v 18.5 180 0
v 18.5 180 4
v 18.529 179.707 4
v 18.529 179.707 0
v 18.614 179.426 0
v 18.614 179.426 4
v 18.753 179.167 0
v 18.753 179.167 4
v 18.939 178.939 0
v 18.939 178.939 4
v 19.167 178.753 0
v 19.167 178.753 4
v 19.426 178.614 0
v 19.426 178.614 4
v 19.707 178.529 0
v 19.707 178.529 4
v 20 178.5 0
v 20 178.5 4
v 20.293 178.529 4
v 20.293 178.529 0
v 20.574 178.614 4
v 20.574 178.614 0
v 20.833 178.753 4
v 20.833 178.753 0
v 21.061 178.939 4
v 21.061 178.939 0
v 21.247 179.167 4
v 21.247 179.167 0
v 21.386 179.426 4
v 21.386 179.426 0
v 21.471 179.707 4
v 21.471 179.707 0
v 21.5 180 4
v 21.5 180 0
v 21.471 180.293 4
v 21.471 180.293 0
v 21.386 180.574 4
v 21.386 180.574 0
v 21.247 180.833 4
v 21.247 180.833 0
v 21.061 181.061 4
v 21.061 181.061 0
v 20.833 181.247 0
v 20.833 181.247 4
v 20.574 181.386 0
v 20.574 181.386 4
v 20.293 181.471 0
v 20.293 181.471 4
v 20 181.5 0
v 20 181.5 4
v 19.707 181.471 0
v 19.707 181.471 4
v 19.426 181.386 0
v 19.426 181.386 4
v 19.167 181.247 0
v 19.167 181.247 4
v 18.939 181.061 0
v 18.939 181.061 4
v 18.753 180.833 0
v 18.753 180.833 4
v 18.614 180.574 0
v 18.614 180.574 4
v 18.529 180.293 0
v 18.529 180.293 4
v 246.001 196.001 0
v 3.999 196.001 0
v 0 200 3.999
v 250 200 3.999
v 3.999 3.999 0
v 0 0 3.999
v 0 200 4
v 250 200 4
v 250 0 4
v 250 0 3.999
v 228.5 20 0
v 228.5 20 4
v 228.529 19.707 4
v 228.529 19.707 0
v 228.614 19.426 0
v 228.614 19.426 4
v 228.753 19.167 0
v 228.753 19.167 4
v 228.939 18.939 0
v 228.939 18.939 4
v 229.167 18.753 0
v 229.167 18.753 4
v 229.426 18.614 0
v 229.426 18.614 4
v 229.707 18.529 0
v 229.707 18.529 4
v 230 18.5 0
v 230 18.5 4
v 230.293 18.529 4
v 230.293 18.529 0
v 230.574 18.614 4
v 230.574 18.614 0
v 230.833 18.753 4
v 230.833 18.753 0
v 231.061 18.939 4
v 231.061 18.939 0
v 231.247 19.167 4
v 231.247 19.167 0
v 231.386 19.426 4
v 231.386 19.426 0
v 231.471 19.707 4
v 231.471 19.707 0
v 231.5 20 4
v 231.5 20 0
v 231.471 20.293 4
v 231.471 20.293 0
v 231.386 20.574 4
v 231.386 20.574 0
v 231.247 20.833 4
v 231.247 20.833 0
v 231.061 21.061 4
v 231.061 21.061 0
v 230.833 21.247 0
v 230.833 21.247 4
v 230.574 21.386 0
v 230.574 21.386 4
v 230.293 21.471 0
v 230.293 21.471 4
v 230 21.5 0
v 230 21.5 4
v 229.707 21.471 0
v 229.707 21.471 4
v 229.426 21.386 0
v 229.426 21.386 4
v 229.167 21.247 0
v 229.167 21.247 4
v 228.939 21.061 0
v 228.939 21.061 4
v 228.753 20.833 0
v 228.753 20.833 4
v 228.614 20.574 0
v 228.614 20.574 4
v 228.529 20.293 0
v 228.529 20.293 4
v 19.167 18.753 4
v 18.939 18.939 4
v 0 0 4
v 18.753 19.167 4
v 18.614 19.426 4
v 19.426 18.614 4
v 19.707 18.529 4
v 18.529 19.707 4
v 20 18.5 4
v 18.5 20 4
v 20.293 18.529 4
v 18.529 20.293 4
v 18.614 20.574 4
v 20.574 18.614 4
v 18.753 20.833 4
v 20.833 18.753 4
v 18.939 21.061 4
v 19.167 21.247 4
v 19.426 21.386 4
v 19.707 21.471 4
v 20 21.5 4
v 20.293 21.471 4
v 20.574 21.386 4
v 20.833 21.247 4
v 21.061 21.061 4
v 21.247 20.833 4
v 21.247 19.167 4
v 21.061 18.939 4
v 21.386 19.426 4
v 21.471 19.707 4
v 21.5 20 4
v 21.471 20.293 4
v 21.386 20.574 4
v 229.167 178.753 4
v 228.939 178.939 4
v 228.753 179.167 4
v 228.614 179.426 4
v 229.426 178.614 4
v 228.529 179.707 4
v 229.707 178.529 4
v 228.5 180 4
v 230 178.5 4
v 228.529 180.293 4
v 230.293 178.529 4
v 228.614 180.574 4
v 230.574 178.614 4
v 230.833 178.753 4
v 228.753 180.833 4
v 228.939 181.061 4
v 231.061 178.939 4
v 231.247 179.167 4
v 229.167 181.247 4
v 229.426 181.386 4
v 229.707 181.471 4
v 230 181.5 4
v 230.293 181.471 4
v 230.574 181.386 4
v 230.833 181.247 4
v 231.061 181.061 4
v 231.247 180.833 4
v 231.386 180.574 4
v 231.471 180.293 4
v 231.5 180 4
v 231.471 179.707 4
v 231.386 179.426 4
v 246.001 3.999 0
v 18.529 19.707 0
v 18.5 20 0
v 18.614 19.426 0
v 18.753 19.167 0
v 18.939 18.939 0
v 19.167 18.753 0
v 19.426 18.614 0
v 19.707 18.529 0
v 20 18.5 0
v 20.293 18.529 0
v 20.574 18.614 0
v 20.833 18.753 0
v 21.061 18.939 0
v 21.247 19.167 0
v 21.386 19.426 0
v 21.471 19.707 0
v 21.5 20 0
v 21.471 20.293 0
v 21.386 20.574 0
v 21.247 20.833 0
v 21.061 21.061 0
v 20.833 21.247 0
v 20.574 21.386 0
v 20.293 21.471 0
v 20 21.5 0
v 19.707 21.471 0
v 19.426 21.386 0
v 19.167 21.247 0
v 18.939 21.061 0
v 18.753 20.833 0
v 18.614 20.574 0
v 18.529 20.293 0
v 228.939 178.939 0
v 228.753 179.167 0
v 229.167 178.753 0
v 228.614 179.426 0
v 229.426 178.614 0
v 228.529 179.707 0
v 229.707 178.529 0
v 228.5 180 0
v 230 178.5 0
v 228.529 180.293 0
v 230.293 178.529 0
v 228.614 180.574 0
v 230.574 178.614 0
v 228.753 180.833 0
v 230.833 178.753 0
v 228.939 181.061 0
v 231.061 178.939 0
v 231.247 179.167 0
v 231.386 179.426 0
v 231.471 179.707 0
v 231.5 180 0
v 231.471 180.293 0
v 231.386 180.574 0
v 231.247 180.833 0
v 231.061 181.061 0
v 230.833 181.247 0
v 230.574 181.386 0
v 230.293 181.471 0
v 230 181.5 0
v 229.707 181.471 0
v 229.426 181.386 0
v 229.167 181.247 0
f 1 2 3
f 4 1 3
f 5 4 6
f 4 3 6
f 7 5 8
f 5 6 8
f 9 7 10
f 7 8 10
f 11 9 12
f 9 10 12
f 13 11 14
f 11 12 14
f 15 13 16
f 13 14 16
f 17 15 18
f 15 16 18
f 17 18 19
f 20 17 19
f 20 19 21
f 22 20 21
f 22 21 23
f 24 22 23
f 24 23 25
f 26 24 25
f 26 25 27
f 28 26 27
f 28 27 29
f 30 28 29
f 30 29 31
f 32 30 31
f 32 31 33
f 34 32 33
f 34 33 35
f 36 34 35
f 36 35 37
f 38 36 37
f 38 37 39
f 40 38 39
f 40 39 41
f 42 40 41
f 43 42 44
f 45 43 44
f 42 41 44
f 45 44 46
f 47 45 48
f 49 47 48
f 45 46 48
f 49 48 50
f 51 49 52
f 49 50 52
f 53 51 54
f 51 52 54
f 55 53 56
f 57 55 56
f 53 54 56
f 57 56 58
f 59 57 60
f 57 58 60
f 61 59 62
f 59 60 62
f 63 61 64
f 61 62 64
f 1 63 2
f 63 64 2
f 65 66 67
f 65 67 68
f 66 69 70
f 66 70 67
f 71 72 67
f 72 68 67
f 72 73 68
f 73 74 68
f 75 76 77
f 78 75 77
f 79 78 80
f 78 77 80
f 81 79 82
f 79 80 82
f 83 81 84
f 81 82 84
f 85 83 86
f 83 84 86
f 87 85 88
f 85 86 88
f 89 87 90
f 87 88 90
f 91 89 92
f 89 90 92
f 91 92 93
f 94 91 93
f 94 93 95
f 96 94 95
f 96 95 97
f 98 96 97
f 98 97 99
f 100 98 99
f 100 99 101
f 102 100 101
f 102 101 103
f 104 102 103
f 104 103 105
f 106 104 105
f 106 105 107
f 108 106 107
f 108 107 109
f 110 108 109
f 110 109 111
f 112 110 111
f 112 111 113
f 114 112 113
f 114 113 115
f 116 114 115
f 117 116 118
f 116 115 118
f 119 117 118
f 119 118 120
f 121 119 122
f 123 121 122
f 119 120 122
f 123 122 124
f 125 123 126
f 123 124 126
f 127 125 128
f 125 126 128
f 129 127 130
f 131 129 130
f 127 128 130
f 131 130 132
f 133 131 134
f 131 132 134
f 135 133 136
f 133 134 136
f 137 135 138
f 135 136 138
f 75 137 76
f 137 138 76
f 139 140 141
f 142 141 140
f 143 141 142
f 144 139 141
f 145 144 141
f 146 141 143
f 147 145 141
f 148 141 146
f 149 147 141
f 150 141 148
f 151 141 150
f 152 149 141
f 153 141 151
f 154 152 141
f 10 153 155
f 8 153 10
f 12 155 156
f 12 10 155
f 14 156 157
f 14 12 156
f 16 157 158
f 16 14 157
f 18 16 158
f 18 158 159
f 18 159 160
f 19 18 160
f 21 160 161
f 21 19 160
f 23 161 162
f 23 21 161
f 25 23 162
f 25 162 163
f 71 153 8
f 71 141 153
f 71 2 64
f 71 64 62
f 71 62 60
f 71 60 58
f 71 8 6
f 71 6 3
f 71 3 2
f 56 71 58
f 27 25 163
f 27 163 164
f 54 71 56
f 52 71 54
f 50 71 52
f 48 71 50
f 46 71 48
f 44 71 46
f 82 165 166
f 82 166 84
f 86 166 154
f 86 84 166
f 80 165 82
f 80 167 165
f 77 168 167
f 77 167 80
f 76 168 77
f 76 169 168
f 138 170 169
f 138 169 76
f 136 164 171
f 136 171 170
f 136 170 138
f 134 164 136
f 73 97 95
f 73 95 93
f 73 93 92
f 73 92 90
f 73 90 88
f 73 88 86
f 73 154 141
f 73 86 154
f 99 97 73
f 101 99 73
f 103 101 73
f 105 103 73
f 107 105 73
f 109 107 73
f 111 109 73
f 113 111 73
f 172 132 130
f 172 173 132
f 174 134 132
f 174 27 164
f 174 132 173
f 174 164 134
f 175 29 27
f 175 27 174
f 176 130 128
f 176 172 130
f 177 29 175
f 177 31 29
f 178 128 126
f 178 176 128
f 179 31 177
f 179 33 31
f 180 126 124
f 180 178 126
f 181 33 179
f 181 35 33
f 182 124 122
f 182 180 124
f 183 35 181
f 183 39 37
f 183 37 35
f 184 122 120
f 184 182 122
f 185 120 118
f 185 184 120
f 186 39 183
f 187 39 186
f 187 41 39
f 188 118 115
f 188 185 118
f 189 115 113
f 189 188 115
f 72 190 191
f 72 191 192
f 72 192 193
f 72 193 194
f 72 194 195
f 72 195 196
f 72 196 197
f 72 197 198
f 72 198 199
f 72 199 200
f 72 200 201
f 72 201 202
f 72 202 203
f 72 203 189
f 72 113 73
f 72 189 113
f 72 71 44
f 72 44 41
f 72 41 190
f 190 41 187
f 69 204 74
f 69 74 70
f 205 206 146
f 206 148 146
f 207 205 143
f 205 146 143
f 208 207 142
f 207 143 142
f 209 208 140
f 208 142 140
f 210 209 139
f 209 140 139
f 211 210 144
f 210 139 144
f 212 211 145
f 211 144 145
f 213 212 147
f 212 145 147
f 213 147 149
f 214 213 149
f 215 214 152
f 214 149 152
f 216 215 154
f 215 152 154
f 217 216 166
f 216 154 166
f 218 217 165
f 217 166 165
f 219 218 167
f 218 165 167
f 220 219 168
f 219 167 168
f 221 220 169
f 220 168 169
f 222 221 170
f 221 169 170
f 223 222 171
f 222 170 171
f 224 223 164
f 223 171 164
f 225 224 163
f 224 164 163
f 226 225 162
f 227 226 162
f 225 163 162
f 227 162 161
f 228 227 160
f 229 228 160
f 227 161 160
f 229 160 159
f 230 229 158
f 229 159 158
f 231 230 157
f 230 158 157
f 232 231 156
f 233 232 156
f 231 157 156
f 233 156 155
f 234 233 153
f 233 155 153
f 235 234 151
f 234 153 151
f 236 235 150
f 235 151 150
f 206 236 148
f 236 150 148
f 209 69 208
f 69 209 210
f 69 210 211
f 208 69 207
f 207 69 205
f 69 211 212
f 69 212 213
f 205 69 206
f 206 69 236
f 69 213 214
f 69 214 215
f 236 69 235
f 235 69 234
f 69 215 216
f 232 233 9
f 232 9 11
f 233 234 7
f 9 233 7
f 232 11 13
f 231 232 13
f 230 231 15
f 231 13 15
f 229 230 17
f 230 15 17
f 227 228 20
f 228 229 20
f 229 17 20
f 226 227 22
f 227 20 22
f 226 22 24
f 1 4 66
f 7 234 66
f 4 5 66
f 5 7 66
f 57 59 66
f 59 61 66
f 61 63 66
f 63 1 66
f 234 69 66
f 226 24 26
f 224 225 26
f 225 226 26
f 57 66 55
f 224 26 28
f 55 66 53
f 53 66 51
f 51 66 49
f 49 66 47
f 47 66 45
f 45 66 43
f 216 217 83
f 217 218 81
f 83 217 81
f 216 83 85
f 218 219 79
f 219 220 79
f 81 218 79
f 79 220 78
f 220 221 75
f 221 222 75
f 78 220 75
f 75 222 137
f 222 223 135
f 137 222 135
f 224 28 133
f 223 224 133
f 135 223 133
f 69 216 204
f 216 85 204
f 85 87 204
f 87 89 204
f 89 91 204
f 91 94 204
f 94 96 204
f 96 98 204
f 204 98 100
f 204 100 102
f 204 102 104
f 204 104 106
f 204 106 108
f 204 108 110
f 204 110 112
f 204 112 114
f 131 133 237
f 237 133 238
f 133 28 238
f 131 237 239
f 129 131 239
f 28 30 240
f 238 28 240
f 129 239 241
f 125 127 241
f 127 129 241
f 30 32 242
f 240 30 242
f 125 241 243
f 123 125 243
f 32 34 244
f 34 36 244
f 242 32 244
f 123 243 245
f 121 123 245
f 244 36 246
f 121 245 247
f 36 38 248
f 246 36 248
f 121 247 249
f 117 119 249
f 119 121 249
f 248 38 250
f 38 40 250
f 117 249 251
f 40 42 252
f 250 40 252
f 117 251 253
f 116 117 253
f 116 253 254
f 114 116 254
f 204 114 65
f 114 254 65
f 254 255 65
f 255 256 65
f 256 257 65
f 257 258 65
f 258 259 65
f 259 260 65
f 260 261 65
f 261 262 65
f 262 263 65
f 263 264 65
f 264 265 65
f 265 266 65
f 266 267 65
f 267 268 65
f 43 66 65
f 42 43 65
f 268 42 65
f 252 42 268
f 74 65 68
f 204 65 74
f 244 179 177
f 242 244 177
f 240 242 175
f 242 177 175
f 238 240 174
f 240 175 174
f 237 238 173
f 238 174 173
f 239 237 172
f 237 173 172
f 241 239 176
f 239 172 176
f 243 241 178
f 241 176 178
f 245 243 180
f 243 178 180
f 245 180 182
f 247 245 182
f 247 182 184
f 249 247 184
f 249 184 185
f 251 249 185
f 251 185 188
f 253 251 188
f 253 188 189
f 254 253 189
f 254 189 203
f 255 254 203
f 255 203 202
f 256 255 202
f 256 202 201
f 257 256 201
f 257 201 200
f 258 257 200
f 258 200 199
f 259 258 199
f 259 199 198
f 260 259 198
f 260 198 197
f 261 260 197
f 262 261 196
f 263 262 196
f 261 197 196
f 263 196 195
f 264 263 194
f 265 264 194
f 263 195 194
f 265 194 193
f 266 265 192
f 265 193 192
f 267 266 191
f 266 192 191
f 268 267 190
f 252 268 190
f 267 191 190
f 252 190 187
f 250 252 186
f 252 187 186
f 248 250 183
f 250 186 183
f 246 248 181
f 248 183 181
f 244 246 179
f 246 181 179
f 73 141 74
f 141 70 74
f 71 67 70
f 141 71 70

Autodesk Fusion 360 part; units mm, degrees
sketch "Esquisse1" plane through (0, 0, 0) normal (0, 0, 1) x (1, 0, 0)
  line L0 (0, 0) -> (250, 0)
  line L1 (250, 0) -> (250, 200)
  line L2 (250, 200) -> (0, 200)
  line L3 (0, 200) -> (0, 0)
  dimension "d18" = 200
  dimension "d19" = 250
extrude "Extrusion1" add sketch "Esquisse1" along normal blind 4
chamfer "Chanfrein1" distance 4 angle 45 1 faces at (83.3333, 133.3333, 0)
sketch "Esquisse2" plane through (0, 0, 4) normal (0, 0, 1) x (-1, 0, 0)
  circle A0 centre (-20, -180) radius 1.5
  circle A1 centre (-230, -180) radius 1.5
  circle A2 centre (-230, -20) radius 1.5
  circle A3 centre (-20, -20) radius 1.5
  line L0 (0, 0) -> (-20, -20)
  line L1 (-250, 0) -> (-230, -20)
  line L2 (-250, 0) -> (-297.1716, 0) construction
  line L3 (0, -200) -> (-20, -180)
  line L4 (-250, -200) -> (-230, -180)
  line L5 (-250, -200) -> (-297.1716, -200) construction
  line L6 (0, -200) -> (0, 0)
  line L7 (0, 0) -> (-250, 0)
  line L8 (-250, 0) -> (-250, -200)
  line L9 (-250, -200) -> (0, -200)
  dimension "d10" = 3
  dimension "d11" = 3
  dimension "d12" = 3
  dimension "d13" = 3
  dimension "d20" = 28.2843
  dimension "d22" = 45
  dimension "d23" = 28.2843
  dimension "d24" = 28.2843
  dimension "d25" = 28.2843
  dimension "d26" = 45
extrude "Extrusion2" cut sketch "Esquisse2" against normal blind 14 contours A0 | A1 | A2 | A3
thread "Filetage1" "ISO Metric profile 4.0 M4x0.7 M4x0.7 6H" major diameter 4.1095 minor diameter 3.332 pitch 0.7 angle 60 resizes the face on face at (21.4536, 179.6299, 2.6667)
thread "Filetage2" "ISO Metric profile 4.0 M4x0.7 M4x0.7 6H" major diameter 4.1095 minor diameter 3.332 pitch 0.7 angle 60 resizes the face on face at (21.4925, 20.1494, 1.3333)
thread "Filetage3" "ISO Metric profile 4.0 M4x0.7 M4x0.7 6H" major diameter 4.1095 minor diameter 3.332 pitch 0.7 angle 60 resizes the face on face at (229.3157, 18.6652, 2.6667)
thread "Filetage4" "ISO Metric profile 4.0 M4x0.7 M4x0.7 6H" major diameter 4.1095 minor diameter 3.332 pitch 0.7 angle 60 resizes the face on face at (229.1244, 178.7821, 1.3333)
equation "d20 = ( sqrt(800) ) * 1 mm"
equation "d23 = ( sqrt(800) ) * 1 mm"
equation "d24 = ( sqrt(800) ) * 1 mm"
equation "d25 = ( sqrt(800) ) * 1 mm"
